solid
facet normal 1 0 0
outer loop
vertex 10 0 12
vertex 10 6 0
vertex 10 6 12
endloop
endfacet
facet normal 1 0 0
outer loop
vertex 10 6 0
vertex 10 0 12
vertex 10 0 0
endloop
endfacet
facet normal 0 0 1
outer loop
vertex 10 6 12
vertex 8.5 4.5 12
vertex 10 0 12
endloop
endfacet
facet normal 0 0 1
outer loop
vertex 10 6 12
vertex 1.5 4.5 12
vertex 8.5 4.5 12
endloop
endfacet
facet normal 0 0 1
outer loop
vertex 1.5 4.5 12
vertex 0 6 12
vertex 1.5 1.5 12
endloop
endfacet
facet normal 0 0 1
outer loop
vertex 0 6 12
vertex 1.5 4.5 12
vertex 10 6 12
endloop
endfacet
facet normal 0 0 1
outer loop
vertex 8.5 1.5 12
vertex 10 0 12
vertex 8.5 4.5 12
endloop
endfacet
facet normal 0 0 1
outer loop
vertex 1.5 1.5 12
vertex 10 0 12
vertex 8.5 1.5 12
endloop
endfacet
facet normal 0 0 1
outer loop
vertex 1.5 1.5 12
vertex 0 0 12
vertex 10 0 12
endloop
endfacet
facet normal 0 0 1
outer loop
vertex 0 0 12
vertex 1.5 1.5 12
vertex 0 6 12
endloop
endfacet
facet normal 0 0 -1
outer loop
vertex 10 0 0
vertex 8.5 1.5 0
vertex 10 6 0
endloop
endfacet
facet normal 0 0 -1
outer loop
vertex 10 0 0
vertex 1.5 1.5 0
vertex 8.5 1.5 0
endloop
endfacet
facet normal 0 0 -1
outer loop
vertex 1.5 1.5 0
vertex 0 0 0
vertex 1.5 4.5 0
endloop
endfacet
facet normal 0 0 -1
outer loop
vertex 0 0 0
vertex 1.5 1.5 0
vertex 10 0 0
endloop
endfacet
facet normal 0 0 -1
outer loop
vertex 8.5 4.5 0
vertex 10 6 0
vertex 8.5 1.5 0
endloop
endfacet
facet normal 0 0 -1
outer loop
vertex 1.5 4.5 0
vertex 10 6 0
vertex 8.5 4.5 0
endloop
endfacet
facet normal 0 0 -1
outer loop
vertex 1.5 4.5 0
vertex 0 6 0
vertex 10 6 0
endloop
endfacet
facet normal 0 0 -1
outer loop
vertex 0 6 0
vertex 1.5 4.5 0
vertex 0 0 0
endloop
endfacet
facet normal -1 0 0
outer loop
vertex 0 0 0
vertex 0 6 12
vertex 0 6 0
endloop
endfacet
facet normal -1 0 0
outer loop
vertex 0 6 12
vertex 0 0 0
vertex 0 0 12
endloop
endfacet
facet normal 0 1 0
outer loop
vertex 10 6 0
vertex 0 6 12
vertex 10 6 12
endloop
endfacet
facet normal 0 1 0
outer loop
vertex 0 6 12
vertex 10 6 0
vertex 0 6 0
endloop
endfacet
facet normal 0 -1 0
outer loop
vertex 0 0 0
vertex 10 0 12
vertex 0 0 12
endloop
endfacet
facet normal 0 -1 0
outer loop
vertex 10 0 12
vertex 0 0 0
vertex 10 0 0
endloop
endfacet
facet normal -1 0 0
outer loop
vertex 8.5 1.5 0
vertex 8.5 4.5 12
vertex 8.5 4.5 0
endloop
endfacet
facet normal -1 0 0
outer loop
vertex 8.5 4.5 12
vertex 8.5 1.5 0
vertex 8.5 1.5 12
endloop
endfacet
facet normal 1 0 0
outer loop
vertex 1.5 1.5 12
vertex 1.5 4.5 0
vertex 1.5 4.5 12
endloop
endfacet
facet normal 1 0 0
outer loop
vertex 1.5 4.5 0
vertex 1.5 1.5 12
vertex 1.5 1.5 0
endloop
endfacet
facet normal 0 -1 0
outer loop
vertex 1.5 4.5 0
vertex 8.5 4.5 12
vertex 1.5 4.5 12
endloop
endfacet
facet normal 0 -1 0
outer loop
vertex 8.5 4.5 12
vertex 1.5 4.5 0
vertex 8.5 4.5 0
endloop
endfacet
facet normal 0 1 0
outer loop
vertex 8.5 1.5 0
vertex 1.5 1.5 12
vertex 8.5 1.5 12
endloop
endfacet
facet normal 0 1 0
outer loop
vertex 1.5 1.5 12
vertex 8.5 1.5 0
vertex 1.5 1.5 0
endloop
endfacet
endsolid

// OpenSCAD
thickness=1.5;
height=12;
innerwidth=7;
innerdepth=3;

difference()
{
cube([innerwidth+thickness*2,innerdepth+thickness*2,height]);
    
translate([thickness,thickness,0]) cube([innerwidth,innerdepth,height]);
}
